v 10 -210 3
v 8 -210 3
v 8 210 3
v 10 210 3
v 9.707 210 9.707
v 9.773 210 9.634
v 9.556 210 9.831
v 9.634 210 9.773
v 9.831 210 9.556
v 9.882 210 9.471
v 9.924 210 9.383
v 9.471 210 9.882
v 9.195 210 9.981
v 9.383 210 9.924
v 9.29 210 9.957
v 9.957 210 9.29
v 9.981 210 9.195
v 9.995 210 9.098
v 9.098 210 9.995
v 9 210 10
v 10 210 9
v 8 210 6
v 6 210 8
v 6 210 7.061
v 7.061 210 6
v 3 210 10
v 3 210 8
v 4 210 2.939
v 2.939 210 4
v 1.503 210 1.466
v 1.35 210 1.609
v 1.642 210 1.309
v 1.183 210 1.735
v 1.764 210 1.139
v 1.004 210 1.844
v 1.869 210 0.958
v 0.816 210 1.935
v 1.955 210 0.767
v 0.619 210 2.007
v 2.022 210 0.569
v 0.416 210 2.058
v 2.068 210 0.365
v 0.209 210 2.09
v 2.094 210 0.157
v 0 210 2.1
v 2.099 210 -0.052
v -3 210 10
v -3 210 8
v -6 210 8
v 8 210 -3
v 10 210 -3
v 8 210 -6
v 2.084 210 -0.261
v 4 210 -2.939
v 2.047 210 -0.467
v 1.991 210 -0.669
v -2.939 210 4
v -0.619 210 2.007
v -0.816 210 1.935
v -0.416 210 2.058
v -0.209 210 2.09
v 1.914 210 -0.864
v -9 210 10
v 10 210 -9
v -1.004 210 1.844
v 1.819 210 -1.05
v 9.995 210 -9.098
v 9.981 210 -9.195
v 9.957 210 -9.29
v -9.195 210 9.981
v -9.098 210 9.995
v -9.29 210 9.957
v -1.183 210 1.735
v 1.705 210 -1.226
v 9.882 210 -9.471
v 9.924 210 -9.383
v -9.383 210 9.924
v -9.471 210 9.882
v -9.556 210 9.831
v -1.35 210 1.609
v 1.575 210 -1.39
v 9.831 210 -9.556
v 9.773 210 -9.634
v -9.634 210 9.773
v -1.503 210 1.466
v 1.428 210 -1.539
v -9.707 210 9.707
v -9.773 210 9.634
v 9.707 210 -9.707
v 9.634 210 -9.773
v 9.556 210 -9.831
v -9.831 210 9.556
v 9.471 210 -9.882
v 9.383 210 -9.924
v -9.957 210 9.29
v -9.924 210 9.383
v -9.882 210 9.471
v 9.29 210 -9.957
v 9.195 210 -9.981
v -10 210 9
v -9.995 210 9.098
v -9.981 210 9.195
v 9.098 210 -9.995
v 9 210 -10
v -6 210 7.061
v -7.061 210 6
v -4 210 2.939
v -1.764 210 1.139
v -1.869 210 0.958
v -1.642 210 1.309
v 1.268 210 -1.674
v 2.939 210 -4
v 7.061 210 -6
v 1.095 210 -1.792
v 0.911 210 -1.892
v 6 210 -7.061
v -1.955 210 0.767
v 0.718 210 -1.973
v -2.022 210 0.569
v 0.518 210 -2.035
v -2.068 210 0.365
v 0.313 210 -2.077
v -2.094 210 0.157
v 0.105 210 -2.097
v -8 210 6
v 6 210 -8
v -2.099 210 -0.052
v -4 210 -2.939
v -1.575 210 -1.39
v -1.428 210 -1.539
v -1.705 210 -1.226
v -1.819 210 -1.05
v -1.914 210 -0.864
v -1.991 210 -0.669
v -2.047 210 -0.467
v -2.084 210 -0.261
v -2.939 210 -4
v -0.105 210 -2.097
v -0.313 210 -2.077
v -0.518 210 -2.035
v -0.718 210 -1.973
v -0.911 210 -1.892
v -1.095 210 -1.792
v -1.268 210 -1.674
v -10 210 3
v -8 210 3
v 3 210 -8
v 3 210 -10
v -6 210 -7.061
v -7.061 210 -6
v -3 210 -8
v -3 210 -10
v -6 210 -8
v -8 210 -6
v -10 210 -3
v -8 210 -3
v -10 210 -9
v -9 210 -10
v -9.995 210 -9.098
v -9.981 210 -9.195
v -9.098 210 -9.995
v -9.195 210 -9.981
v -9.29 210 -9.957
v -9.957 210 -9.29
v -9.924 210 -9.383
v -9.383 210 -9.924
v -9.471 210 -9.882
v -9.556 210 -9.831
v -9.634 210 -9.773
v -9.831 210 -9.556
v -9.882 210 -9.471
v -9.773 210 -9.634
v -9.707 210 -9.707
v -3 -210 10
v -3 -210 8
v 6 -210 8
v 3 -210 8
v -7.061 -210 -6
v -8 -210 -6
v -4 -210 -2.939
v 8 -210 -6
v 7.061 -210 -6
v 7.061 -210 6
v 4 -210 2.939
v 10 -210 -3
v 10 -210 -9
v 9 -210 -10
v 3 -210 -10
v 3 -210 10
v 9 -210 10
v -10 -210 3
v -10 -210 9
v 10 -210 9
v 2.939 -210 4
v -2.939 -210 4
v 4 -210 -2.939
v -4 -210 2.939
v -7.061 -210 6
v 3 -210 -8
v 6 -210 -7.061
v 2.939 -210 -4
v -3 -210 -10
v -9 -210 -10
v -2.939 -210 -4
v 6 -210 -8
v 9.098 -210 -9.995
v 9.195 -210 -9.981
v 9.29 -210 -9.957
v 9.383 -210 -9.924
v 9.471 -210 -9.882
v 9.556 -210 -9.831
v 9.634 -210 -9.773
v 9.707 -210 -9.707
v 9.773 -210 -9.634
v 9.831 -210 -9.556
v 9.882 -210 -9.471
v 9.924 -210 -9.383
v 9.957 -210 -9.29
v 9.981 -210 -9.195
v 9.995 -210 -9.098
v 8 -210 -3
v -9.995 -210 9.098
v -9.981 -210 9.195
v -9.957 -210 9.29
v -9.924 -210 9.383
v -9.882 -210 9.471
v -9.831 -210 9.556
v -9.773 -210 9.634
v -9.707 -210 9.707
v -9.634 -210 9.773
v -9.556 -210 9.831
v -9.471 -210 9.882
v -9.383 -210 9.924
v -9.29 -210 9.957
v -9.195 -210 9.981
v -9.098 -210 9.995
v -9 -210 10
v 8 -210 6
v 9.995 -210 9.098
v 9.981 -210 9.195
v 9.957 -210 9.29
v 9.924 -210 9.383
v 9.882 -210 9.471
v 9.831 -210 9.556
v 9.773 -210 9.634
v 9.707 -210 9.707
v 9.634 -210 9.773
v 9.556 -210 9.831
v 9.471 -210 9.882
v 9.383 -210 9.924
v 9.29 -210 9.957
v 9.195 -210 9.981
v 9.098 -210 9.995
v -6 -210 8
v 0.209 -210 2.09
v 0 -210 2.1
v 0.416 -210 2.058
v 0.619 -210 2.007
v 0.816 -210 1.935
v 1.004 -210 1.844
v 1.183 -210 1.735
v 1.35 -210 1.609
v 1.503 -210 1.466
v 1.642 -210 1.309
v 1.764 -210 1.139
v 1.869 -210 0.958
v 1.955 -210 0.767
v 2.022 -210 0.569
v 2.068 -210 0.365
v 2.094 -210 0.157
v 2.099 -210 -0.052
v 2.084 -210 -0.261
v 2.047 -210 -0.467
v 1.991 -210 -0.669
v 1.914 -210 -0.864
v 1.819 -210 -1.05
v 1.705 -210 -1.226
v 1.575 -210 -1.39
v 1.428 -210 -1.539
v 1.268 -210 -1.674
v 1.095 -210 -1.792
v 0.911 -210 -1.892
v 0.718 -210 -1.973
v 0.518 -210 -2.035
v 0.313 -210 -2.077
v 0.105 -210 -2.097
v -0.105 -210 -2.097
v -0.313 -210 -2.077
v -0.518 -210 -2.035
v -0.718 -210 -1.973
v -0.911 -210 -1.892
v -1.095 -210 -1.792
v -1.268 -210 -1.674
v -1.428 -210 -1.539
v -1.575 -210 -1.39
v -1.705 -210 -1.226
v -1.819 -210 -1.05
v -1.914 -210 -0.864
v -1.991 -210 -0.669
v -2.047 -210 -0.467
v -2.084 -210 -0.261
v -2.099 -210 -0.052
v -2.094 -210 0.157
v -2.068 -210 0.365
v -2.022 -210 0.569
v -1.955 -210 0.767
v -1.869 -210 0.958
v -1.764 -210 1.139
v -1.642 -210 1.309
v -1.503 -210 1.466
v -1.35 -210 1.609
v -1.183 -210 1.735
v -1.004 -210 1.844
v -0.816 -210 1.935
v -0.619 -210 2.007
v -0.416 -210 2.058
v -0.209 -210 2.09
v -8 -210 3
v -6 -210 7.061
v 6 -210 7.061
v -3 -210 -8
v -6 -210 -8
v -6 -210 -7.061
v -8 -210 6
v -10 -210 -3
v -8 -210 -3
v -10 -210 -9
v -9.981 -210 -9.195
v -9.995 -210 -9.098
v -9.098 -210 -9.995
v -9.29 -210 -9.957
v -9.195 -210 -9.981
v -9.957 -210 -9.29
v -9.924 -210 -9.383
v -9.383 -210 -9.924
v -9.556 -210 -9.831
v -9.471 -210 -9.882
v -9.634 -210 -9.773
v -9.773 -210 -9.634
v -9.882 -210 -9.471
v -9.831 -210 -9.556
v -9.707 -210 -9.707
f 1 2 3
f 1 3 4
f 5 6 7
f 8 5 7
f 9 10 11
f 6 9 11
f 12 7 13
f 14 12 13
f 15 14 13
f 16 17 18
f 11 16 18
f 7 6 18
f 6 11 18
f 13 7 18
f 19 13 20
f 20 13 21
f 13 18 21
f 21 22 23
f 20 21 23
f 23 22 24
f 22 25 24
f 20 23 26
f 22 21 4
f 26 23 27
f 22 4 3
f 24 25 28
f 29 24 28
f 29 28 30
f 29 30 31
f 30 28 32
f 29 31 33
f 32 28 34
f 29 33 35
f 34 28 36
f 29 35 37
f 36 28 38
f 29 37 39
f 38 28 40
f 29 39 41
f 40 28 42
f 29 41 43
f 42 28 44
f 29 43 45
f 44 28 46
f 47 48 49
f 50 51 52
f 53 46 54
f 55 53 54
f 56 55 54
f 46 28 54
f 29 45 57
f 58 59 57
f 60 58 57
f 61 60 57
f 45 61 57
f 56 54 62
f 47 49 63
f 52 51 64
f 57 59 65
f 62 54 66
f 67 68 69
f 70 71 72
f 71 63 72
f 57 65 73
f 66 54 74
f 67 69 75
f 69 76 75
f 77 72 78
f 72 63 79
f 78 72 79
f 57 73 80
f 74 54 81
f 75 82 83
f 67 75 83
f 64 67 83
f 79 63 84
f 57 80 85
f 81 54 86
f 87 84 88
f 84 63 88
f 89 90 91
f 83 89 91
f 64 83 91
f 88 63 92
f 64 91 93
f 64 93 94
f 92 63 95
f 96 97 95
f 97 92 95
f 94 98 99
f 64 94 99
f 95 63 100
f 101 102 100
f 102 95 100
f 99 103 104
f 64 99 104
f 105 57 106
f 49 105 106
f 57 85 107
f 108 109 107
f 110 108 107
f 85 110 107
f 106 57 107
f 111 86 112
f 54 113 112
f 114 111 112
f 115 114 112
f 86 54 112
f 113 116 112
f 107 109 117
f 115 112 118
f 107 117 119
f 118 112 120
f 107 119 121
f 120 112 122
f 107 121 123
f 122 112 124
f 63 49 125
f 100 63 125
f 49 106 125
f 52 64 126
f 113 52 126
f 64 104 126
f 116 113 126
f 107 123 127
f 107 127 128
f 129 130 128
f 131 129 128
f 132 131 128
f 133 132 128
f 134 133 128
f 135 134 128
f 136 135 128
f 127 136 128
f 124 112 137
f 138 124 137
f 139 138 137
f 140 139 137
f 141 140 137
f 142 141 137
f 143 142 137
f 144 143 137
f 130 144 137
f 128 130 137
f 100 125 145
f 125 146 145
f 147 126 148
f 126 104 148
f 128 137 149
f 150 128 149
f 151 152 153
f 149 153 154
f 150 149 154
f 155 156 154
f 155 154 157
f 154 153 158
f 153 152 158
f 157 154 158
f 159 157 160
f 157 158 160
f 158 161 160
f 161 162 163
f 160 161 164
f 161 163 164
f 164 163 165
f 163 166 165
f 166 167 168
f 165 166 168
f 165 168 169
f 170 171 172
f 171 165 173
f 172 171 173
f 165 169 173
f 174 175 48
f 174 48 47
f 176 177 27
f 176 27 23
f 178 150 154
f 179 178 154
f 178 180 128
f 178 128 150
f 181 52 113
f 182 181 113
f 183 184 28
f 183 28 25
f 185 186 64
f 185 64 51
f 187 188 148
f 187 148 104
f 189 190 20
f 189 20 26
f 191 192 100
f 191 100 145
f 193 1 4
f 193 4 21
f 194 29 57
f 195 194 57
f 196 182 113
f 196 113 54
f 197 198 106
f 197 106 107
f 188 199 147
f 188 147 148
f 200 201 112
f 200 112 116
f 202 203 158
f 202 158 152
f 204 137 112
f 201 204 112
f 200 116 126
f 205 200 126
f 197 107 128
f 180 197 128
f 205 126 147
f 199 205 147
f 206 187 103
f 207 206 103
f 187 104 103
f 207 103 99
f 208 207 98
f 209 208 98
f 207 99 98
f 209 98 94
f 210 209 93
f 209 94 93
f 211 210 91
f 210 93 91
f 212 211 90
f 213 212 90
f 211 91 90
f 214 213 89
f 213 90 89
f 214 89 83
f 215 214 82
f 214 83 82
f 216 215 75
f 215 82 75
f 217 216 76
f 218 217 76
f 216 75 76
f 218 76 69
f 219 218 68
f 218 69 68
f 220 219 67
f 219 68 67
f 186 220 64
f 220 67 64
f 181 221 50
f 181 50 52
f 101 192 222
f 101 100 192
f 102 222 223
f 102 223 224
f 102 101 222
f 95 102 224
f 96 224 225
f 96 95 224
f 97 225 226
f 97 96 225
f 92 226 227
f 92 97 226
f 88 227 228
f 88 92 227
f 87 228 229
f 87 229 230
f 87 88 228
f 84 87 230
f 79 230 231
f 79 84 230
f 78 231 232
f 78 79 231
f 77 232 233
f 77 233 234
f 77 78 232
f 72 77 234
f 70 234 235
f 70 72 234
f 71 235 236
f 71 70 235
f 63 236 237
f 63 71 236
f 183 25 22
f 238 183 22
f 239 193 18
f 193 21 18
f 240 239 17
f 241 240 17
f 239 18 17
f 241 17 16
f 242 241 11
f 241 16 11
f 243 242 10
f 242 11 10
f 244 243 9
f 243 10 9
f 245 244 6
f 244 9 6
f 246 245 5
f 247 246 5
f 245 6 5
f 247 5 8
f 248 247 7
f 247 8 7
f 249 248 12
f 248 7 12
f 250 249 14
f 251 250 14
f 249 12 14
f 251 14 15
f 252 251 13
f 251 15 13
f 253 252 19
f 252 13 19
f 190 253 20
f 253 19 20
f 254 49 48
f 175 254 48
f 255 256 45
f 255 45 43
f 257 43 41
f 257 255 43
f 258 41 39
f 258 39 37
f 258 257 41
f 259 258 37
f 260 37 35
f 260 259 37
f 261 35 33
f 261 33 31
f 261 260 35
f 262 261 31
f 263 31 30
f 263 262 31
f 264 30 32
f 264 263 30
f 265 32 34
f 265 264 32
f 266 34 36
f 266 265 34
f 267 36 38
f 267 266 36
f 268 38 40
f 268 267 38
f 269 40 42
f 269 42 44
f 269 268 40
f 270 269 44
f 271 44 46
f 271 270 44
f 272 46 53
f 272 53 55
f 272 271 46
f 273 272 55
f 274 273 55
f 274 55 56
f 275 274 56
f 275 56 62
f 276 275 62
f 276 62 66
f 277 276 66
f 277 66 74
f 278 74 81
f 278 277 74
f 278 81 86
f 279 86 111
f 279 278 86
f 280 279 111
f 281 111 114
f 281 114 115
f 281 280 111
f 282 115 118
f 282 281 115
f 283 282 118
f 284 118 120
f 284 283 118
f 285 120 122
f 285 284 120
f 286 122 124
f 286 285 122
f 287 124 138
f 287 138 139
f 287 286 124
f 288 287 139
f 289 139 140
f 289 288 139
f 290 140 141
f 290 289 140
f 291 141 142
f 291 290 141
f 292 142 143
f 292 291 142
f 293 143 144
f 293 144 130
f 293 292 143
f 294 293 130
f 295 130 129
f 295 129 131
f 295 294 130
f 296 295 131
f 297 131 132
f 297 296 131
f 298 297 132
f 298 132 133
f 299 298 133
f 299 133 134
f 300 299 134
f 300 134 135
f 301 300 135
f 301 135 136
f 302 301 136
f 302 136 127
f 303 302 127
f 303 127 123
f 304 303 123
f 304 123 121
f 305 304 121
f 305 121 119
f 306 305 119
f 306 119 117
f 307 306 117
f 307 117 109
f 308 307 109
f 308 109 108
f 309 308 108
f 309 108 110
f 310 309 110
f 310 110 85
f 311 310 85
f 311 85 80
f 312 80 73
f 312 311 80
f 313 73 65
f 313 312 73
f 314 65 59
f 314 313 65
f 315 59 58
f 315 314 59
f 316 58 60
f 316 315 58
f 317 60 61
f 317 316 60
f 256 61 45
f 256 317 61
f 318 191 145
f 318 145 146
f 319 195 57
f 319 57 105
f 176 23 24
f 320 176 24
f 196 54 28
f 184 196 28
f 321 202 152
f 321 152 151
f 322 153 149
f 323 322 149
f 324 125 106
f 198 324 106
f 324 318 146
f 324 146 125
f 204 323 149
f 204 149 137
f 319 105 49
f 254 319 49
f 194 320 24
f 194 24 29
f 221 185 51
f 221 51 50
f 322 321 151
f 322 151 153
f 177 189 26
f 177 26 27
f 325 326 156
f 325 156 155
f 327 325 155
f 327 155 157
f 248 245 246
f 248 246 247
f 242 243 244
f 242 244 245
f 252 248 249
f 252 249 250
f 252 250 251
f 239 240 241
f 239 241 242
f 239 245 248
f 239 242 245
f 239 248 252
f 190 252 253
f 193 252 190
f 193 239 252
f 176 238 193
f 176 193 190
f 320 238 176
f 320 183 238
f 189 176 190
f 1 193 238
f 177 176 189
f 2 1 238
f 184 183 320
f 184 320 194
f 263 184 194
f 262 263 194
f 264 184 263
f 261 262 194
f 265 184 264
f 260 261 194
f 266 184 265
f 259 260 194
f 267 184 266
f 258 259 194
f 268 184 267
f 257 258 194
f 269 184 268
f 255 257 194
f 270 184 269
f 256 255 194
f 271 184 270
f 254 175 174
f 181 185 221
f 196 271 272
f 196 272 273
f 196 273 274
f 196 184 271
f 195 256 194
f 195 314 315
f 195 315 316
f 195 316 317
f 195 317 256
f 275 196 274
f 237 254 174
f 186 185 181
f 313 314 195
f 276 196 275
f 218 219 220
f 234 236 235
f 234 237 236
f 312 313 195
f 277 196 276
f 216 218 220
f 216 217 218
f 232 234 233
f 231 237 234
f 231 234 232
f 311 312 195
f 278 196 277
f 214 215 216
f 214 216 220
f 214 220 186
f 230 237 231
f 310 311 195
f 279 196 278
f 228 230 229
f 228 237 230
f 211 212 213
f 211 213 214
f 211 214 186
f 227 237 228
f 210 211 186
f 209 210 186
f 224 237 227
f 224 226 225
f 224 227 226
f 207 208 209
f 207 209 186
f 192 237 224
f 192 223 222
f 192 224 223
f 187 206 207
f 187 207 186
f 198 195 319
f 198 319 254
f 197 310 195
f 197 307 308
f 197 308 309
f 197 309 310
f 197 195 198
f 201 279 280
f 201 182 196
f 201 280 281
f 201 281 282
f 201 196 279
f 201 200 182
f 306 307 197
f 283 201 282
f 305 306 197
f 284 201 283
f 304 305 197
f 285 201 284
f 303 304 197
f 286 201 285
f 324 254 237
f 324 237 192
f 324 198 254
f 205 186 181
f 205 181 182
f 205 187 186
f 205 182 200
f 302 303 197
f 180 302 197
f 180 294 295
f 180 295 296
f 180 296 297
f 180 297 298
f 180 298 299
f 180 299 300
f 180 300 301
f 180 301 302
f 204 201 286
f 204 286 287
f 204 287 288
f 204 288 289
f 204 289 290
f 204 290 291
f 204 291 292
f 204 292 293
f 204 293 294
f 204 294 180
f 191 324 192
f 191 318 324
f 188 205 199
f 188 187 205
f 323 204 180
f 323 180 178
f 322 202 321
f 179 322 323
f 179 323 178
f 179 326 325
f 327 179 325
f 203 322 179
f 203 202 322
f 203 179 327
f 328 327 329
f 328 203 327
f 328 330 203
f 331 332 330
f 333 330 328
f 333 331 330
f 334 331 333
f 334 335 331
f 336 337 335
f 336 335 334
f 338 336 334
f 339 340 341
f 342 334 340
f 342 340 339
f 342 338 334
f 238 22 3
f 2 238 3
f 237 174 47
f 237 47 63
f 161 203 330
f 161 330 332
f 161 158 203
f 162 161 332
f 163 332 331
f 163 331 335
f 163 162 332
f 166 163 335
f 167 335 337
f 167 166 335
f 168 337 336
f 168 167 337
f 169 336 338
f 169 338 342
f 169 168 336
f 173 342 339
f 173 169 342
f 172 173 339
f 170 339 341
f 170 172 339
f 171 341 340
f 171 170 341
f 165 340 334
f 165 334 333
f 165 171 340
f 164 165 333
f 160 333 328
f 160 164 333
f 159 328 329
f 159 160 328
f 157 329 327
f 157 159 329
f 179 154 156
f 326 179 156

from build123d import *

# Parameters (mm, degrees)
BASE_EXTRUSTION_DEPTH      = 210
BASE_EXTRUSTION_DEPTH_BACK = 210
SKETCH1_R                  = 2.1
CORNERS_R                  = 1


with BuildPart() as part:
    # Sketch1 → Base Extrustion (new, two sides: drawn at the far end of the back side and taken through both)
    with BuildSketch(Plane(origin=(0, 0, 0), x_dir=(1, 0, 0), z_dir=(0, 1, 0)).offset(-BASE_EXTRUSTION_DEPTH_BACK)):
        Polygon((-10, 10), (-3, 10), (-3, 8), (-6, 8), (-6, 7.060660172), (-2.939339828, 4), (2.939339828, 4), (6, 7.060660172), (6, 8), (3, 8), (3, 10), (10, 10), (10, 3), (8, 3), (8, 6), (7.060660172, 6), (4, 2.939339828), (4, -2.939339828), (7.060660172, -6), (8, -6), (8, -3), (10, -3), (10, -10), (3, -10), (3, -8), (6, -8), (6, -7.060660172), (2.939339828, -4), (-2.939339828, -4), (-6, -7.060660172), (-6, -8), (-3, -8), (-3, -10), (-10, -10), (-10, -3), (-8, -3), (-8, -6), (-7.060660172, -6), (-4, -2.939339828), (-4, 2.939339828), (-7.060660172, 6), (-8, 6), (-8, 3), (-10, 3), align=None)
        with Locations(Location((0, 0, 0), (0, 0, 270))):
            Circle(SKETCH1_R, mode=Mode.SUBTRACT)
    extrude(amount=BASE_EXTRUSTION_DEPTH + BASE_EXTRUSTION_DEPTH_BACK)

    # Corners
    corners_edges = [part.edges().sort_by_distance(p)[0] for p in [
        (-10, 0, -10),
        (10, 0, -10),
        (10, 0, 10),
        (-10, 0, 10),
    ]]
    fillet(corners_edges, radius=CORNERS_R)


solid = part.part
